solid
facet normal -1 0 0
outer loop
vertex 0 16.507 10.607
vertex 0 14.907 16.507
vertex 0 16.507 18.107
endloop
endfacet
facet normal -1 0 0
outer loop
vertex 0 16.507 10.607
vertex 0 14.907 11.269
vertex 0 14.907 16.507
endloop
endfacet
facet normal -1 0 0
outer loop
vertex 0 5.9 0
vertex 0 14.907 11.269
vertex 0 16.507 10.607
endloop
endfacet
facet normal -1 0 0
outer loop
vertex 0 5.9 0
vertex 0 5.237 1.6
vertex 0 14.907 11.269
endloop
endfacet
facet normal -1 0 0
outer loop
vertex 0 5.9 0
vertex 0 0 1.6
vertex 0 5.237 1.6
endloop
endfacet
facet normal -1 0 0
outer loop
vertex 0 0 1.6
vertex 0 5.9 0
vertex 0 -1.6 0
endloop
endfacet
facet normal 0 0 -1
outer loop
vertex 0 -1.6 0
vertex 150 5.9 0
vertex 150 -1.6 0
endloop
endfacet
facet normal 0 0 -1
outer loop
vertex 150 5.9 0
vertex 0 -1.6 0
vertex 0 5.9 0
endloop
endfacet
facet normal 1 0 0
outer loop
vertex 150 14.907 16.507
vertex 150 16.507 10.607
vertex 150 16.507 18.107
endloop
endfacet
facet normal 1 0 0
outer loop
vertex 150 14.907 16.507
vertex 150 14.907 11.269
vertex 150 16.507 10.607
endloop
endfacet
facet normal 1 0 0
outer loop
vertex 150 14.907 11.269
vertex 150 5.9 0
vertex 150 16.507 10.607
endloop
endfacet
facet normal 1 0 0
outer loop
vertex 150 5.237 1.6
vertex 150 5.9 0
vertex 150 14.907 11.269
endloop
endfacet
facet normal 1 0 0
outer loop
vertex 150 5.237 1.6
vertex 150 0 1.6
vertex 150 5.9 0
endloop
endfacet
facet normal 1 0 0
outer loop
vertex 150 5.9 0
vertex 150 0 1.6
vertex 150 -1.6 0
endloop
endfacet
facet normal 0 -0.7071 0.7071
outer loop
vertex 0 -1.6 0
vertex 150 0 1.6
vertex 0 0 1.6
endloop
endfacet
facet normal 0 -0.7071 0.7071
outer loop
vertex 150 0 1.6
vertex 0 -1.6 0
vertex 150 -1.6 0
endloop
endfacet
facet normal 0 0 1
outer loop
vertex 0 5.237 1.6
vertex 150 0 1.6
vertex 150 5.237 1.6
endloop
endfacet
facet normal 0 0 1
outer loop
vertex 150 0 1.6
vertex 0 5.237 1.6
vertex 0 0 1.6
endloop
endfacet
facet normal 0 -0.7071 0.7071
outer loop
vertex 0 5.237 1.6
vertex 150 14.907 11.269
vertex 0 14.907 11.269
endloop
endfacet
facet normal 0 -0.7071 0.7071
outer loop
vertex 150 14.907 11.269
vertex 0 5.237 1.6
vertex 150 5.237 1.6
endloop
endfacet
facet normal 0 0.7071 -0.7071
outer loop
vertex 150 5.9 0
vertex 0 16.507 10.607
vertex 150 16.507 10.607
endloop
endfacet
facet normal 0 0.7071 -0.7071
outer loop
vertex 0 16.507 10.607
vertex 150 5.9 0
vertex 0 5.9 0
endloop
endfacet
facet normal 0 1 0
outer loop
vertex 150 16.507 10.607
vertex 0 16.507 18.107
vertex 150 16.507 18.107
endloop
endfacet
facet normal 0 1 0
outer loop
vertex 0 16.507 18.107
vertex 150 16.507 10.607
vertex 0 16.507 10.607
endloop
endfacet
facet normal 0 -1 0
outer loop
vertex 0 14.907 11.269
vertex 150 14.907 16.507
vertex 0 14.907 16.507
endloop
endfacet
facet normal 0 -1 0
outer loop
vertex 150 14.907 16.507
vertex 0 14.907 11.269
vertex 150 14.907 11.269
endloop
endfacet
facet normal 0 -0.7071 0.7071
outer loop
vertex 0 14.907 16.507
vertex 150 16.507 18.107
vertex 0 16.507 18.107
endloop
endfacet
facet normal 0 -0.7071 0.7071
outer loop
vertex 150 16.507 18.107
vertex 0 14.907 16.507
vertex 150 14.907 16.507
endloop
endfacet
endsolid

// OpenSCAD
//Quer
q=15;
//Breite Fließe
bf=150;
//Dicke
d=1.6;
//Tiefe Hoehe
th=q/2;
//Tiefe
t=th-d;
//Hoehe
h=th;

module leiste()
{
rotate([90,0,90])
linear_extrude(bf)
polygon([[-d,0],[0,0],[0,d]]);

cube([bf,t,d]);

translate([0,t,0])
rotate([45,0,0])
cube([bf,q,d]);

translate([0,t+sin(45)*q-d,sin(45)*q])
cube([bf,d,h-d]);

translate([bf,t+sin(45)*q,sin(45)*q+h-d])
rotate([270,90,90])
linear_extrude(bf)
polygon([[-d,0],[0,0],[0,d]]);
}

leiste();
module leisteecke()
{
translate([q+d,-bf/2,0])
rotate([0,0,90])
leiste();
}

module leiste90()
{
translate([0,-bf,0])
rotate([0,0,90])
leiste();
}
//leiste90();
